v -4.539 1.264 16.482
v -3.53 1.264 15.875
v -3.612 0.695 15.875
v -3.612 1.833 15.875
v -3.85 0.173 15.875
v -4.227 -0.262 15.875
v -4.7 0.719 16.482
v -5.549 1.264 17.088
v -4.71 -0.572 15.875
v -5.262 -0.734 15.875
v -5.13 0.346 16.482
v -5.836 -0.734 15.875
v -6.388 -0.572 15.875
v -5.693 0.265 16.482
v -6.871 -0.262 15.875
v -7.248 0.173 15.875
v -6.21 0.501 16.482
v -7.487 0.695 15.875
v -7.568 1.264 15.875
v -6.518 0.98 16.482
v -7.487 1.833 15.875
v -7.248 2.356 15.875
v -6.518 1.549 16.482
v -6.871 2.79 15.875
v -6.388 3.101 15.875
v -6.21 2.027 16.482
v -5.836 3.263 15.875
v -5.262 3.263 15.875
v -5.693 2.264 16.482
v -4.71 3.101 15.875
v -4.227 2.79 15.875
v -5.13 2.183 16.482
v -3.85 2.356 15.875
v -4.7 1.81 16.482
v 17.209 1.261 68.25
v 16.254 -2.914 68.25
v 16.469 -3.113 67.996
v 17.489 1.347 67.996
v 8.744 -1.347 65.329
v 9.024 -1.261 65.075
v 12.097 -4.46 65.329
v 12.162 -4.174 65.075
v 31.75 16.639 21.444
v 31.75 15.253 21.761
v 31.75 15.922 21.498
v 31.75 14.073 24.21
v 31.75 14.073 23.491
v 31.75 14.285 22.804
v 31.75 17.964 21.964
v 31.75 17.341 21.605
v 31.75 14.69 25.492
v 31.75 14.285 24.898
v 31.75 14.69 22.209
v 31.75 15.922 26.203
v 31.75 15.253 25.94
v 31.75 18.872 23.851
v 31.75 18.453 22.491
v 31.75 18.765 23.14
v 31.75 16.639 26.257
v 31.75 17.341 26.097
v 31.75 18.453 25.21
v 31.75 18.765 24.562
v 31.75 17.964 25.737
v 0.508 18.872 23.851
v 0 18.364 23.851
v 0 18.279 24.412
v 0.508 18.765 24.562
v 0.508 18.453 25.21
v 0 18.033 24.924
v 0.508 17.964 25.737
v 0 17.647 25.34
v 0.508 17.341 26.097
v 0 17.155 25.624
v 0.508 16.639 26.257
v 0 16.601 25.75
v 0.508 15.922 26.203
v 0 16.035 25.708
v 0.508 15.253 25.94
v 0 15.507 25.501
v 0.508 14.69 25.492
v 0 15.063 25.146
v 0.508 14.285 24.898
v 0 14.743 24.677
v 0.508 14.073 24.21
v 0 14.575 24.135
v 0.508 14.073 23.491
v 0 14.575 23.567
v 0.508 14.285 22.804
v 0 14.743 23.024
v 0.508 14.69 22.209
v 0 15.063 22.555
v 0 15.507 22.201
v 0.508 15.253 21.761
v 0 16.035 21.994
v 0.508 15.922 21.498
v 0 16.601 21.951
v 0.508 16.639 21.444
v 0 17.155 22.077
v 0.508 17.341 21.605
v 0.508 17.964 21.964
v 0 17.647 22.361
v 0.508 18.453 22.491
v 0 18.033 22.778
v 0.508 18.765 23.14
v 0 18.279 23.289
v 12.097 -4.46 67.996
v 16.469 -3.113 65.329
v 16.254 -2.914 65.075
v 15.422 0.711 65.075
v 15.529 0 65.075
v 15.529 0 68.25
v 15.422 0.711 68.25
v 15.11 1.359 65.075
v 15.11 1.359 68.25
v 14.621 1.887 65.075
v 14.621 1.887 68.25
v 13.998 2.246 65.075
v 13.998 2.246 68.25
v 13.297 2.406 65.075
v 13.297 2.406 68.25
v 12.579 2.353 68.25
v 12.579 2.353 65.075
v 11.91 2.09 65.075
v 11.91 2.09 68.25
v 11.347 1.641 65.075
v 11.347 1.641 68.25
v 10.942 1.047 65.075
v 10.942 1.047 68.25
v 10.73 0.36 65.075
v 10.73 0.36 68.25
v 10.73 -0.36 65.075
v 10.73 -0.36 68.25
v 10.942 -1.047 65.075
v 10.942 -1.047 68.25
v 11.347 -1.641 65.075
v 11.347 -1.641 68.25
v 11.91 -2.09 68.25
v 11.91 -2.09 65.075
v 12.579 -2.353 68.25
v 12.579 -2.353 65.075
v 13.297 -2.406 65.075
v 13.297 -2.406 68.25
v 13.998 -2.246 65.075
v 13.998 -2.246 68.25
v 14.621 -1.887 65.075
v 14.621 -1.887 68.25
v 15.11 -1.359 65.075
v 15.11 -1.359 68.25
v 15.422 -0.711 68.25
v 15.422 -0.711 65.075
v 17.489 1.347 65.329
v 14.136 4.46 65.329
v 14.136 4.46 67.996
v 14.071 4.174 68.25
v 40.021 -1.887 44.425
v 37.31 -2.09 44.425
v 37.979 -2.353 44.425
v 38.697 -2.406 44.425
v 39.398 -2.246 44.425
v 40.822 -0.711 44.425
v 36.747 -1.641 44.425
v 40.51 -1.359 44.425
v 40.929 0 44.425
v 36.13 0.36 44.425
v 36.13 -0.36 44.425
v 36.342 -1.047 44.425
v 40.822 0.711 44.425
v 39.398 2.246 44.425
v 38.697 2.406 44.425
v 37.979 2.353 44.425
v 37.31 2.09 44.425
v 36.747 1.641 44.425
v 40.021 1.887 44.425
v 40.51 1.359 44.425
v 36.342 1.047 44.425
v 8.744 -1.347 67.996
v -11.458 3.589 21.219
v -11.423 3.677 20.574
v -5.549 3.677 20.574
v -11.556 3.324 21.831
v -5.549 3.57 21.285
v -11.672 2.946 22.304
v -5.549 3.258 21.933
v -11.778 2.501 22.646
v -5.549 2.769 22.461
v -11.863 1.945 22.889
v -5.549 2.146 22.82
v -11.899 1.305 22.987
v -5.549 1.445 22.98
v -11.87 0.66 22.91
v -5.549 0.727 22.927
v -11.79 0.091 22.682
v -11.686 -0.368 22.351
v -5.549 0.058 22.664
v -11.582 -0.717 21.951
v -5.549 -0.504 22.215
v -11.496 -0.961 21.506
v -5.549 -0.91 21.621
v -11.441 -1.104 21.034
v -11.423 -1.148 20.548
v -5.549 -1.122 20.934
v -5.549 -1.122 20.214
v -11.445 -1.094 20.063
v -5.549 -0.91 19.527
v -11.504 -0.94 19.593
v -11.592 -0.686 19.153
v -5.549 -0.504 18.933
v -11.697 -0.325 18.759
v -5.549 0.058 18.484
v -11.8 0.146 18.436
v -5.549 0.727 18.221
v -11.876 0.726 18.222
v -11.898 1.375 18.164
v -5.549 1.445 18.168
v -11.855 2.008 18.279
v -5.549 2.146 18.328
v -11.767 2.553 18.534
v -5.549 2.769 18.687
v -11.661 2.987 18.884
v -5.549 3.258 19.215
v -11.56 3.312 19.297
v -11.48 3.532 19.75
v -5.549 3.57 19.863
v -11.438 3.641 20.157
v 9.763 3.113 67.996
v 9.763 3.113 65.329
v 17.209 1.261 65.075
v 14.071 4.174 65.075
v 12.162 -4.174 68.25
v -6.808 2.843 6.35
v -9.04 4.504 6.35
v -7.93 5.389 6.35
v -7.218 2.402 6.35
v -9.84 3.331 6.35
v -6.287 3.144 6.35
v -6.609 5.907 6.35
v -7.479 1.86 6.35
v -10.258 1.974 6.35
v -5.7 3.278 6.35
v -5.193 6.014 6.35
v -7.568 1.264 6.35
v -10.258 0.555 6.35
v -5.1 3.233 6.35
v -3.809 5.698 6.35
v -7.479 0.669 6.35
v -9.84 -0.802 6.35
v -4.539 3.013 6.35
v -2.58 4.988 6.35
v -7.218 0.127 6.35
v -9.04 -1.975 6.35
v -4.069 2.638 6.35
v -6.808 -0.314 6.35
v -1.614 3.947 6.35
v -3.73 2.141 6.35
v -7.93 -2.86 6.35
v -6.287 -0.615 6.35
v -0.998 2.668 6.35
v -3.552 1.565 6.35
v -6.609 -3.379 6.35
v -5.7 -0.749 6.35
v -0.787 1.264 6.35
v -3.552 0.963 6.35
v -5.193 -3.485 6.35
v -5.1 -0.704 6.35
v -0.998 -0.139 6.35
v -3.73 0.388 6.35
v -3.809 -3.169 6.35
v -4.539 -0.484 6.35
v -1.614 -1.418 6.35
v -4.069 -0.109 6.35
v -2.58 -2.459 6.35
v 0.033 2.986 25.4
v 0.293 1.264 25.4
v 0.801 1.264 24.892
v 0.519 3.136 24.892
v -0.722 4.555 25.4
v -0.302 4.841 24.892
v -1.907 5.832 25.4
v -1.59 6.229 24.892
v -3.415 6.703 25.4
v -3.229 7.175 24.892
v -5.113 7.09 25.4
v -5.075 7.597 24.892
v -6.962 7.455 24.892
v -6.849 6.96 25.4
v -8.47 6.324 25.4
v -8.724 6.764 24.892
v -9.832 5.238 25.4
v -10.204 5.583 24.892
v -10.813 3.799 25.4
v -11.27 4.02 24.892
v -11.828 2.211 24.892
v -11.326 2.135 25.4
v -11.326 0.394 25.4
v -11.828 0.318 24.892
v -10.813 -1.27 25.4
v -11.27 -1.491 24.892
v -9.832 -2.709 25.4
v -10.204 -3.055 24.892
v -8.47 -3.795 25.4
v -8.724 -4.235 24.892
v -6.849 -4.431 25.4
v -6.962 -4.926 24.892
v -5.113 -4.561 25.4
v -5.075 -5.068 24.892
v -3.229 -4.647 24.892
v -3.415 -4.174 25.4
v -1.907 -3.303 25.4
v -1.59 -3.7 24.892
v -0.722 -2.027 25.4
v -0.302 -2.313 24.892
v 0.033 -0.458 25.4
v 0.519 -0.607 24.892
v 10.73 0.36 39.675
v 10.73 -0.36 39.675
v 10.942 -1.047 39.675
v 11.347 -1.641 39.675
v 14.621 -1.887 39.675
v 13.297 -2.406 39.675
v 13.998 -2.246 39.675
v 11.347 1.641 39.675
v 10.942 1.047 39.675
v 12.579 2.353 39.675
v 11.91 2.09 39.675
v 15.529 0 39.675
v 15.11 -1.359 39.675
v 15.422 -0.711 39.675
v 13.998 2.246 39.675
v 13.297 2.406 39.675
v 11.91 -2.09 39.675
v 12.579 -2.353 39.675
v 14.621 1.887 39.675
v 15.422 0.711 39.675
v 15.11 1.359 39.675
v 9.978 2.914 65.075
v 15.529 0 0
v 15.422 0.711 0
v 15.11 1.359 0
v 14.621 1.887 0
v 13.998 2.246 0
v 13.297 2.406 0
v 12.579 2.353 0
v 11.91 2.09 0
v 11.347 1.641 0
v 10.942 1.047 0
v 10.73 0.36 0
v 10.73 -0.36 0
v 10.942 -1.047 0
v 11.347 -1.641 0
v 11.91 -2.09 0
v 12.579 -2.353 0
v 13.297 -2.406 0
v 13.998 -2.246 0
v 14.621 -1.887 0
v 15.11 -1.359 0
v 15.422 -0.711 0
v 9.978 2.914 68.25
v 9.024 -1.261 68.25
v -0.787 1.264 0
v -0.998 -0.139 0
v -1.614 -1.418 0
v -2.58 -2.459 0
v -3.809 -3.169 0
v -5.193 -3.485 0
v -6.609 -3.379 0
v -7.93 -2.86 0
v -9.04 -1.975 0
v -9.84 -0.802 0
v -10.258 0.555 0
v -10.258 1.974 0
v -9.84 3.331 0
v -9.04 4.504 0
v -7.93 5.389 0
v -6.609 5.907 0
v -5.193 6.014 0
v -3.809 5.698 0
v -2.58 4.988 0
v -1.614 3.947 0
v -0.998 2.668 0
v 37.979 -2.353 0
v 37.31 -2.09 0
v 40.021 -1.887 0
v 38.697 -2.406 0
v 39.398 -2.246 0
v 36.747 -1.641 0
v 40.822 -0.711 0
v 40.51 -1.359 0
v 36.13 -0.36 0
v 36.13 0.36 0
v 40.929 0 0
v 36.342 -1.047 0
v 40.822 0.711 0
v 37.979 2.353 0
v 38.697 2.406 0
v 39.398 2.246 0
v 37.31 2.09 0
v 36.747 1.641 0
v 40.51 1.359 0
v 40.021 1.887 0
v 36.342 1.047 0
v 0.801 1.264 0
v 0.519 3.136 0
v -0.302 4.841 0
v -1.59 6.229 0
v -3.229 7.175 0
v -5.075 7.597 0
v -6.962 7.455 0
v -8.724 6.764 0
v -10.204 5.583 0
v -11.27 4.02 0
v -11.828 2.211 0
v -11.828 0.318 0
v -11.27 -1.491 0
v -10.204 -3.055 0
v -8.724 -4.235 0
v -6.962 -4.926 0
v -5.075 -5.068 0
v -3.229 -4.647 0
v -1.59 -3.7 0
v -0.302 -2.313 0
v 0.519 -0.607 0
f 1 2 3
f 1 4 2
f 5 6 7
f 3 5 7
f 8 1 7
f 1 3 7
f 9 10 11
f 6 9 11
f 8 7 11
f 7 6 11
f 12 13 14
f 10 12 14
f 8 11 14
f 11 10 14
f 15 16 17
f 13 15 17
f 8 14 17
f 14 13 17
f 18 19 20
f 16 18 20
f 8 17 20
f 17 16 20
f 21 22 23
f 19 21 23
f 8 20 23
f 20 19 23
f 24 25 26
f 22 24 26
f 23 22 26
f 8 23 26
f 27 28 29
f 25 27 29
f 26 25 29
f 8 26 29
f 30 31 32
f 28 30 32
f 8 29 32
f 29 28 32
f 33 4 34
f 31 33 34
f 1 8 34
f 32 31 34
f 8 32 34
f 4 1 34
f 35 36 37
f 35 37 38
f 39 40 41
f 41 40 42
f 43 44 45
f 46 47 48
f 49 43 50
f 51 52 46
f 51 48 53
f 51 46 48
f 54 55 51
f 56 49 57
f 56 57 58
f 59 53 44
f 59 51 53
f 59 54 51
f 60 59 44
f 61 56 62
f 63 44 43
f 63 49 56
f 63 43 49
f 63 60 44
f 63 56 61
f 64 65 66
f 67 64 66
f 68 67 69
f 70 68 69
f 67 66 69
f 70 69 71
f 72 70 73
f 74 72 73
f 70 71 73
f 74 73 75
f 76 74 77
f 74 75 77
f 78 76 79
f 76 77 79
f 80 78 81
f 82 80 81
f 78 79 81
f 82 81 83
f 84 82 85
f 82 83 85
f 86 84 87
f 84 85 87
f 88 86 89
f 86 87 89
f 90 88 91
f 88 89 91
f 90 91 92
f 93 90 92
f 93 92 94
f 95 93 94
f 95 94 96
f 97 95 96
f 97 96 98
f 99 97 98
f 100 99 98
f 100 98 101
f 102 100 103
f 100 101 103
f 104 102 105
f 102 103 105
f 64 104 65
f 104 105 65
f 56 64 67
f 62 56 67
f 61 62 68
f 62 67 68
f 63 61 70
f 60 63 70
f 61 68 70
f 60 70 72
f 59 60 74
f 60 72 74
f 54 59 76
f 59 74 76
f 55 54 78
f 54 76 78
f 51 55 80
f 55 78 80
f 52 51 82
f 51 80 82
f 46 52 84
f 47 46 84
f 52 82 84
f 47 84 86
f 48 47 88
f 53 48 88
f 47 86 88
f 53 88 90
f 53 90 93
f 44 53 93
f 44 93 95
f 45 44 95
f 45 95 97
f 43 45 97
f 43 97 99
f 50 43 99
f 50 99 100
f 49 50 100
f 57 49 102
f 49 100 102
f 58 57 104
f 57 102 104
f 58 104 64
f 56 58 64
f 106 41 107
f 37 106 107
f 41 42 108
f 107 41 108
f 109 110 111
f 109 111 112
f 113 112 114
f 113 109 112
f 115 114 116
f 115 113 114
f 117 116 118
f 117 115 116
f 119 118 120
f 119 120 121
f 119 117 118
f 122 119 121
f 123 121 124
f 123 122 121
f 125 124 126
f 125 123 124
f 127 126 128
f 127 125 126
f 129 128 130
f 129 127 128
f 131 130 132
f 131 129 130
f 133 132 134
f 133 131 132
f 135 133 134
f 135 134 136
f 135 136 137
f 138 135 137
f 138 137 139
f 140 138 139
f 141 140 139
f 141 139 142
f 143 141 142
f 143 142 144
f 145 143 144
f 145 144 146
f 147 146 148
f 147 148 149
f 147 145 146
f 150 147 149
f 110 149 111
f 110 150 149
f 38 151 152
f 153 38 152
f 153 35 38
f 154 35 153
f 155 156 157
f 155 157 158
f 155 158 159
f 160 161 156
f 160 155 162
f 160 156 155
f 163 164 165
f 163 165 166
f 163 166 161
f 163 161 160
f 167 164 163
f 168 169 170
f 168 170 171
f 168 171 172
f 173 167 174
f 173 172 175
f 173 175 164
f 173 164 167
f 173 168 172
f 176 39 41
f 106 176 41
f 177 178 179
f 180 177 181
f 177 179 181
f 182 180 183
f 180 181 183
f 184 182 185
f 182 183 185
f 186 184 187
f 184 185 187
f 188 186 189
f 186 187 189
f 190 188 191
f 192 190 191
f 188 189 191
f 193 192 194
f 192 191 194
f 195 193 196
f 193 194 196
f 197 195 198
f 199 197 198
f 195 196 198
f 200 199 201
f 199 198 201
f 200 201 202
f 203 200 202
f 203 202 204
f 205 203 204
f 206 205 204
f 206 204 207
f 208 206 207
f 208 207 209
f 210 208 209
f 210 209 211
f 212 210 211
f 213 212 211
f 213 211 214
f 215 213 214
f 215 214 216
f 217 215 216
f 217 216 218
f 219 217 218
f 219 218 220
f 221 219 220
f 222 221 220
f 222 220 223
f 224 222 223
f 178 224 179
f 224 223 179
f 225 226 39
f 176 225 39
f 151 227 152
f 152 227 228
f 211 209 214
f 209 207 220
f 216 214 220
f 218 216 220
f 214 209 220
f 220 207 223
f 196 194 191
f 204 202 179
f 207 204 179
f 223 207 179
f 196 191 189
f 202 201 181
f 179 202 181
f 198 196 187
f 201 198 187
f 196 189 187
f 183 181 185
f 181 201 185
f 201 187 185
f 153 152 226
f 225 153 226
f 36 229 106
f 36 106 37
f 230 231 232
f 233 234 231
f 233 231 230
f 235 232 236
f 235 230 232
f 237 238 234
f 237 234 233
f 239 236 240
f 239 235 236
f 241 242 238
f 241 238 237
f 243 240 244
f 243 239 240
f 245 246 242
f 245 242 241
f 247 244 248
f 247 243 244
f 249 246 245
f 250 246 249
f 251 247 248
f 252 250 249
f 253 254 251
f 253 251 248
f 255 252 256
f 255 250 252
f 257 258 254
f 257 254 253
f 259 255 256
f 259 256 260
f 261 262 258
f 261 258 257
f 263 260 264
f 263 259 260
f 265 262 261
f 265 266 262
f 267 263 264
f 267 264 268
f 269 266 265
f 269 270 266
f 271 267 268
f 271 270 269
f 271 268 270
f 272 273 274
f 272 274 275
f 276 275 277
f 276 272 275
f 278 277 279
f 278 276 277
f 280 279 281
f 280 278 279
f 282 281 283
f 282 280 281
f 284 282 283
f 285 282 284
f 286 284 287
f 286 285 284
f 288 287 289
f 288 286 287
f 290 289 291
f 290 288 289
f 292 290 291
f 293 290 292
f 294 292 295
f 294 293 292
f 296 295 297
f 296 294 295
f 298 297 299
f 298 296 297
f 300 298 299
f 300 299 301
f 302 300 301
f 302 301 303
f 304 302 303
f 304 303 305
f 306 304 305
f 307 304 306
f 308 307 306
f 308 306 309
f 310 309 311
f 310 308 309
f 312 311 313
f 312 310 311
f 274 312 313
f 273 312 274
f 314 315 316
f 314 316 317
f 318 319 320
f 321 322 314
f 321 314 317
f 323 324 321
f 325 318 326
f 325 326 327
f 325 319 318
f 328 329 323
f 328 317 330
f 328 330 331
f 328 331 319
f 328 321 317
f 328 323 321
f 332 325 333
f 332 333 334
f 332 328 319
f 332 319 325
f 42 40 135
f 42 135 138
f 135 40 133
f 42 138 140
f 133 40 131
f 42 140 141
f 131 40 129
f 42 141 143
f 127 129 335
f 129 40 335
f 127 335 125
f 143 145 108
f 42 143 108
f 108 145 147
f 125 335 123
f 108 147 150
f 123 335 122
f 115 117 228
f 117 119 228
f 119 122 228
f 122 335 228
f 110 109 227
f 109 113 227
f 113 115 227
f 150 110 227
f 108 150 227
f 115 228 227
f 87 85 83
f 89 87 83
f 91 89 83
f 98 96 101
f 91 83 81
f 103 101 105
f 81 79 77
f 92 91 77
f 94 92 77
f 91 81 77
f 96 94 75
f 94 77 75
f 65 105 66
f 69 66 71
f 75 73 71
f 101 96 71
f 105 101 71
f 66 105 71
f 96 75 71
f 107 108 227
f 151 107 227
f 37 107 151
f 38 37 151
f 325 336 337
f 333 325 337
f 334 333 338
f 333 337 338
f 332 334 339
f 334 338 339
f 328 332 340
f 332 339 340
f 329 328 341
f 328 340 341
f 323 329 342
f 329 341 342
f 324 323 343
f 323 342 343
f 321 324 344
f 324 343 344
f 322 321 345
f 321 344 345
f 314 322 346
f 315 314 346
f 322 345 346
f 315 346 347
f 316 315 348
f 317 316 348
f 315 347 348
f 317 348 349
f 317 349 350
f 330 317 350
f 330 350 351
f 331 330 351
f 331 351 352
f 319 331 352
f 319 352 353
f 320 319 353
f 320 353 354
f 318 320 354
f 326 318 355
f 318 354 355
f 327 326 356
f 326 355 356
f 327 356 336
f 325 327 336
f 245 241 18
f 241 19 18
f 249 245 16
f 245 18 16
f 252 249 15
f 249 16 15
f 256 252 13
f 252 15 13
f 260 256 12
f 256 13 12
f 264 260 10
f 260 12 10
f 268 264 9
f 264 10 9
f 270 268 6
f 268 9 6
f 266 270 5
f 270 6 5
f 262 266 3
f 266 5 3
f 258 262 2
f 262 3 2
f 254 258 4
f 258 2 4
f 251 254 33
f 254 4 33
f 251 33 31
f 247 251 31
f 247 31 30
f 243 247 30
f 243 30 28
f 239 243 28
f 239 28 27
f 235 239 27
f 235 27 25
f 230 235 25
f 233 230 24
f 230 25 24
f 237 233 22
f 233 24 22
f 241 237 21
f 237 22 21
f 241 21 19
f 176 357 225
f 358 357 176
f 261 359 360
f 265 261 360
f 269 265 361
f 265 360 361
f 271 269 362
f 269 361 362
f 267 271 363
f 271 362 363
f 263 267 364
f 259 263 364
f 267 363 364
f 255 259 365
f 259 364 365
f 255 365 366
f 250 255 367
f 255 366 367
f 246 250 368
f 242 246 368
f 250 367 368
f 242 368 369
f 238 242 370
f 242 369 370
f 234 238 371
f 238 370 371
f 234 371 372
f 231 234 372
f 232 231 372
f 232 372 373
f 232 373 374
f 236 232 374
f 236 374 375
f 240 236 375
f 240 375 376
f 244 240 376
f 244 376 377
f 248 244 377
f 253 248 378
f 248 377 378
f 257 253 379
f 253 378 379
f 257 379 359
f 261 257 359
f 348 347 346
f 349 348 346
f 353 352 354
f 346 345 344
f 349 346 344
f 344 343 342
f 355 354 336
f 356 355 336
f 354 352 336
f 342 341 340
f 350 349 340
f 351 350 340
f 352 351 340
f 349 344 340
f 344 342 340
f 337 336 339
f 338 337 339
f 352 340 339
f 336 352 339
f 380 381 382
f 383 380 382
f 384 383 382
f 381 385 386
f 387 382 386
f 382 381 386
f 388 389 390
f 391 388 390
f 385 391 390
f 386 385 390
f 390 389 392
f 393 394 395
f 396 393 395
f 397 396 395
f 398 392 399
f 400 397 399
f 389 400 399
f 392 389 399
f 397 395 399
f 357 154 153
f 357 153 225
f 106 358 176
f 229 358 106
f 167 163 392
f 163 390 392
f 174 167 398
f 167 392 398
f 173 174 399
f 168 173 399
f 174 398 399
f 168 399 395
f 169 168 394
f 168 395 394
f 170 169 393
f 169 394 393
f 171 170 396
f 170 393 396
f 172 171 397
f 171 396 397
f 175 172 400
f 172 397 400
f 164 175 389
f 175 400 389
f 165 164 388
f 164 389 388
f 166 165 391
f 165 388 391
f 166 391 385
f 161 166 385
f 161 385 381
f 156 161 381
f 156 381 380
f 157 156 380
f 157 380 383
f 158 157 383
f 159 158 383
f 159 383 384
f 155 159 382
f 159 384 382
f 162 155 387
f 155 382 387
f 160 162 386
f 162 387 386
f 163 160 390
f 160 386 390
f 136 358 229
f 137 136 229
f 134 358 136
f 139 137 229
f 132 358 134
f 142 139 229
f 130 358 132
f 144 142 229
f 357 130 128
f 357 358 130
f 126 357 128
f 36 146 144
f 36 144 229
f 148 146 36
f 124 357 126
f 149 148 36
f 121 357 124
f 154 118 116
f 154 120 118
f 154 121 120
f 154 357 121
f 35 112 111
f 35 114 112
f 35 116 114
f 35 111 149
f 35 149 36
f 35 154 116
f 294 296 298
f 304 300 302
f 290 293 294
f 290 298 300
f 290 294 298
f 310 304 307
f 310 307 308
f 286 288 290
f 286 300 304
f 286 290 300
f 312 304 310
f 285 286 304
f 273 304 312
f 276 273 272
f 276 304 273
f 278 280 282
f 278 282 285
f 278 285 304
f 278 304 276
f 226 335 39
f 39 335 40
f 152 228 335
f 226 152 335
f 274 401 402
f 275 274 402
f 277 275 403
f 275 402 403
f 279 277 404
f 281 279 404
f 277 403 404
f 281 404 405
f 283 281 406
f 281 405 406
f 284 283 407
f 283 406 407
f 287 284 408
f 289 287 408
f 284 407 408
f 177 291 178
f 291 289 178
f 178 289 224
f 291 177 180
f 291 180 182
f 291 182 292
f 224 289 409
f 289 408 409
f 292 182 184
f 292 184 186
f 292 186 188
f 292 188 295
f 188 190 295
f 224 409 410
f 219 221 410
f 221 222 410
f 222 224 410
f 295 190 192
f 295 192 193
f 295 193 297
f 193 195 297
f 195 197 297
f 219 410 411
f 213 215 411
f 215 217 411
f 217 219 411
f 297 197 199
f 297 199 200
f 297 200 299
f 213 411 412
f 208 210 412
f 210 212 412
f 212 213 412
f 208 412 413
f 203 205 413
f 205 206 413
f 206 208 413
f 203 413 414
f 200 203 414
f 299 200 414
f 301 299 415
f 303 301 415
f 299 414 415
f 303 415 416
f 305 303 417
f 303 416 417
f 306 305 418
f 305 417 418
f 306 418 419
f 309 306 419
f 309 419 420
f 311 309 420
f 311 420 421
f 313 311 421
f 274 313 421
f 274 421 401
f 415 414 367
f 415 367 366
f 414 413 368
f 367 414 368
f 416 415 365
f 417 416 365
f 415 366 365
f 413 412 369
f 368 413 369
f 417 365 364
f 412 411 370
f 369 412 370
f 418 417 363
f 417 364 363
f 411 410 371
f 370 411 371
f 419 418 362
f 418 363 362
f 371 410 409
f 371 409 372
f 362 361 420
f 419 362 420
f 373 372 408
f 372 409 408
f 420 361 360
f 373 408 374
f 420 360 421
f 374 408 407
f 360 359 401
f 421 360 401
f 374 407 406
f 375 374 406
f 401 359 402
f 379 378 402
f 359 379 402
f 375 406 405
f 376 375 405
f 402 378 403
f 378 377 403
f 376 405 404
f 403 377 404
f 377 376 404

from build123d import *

# Parameters (mm, degrees)
F0_R       = 2.413
F1_DEPTH   = 39.6748
F3_DEPTH   = 4.7498
F5_R       = 2.413
F6_DEPTH   = 3.175
F7_SIZE    = 0.254
F8_R       = 6.35
F9_DEPTH   = 25.4
F10_R      = 4.7625
F11_DEPTH  = 6.35
F13_D      = 4.0386
F13_DEPTH  = 9.525
F13_TIP    = 1.213317848
F15_R      = 2.413
F16_DEPTH  = 6.351
F17_R      = 2.413
F18_DEPTH  = 31.75
F19_SIZE   = 0.508
F19_2_SIZE = 0.508


with BuildPart() as f1:
    # F0 (on Top) → F1 (new body)
    with BuildSketch(Plane.XY):
        with Locations((13.1162918267, 0)):
            Circle(F0_R)
    extrude(amount=F1_DEPTH)


with BuildPart() as f2_1:
    # F2: copy of F1
    add(f1.part.moved(Location((25.4, 0, 0))))

    # F3 (add): a face of the model
    f3_faces = [f2_1.faces().sort_by_distance(p)[0] for p in [
        (38.5162918267, 0, 39.6748),
    ]]
    extrude(f3_faces, amount=F3_DEPTH)


with BuildPart() as f6:
    # F5 (on offset) → F6 (new body)
    with BuildSketch(Plane.XY.offset(65.0748)):
        Polygon((9.7633792917, 3.1132184653), (8.7437092808, -1.3470981994), (12.0966218158, -4.4603166646), (16.4692043617, -3.1132184653), (17.4888743727, 1.3470981994), (14.1359618377, 4.4603166646), align=None)
        with Locations((13.1162918267, 0)):
            Circle(F5_R, mode=Mode.SUBTRACT)
    extrude(amount=F6_DEPTH)

    # F7
    f7_edges = [f6.edges().sort_by_distance(p)[0] for p in [
        (9.253544, 0.88306, 68.2498),
        (11.949671, 3.786768, 68.2498),
        (15.812418, 2.903707, 68.2498),
        (16.979039, -0.88306, 68.2498),
        (14.282913, -3.786768, 68.2498),
        (10.420166, -2.903707, 68.2498),
        (15.812418, 2.903707, 65.0748),
        (11.949671, 3.786768, 65.0748),
        (9.253544, 0.88306, 65.0748),
        (10.420166, -2.903707, 65.0748),
        (14.282913, -3.786768, 65.0748),
        (16.979039, -0.88306, 65.0748),
    ]]
    chamfer(f7_edges, length=F7_SIZE)


with BuildPart() as f9:
    # F8 (on Top) → F9 (new body)
    with BuildSketch(Plane.XY):
        with Locations((-5.549098365, 1.2644021772)):
            Circle(F8_R)
    extrude(amount=F9_DEPTH)

    # F10 (on face) → F11 (cut)
    with BuildSketch(Plane(origin=(0, 0, 0), x_dir=(1, 0, 0), z_dir=(0, 0, -1))):
        with Locations((-5.549098365, -1.2644021772)):
            Circle(F10_R)
    extrude(amount=-F11_DEPTH, mode=Mode.SUBTRACT)

    # F13
    with Locations(Plane(origin=(0, 0, 6.35), x_dir=(1, 0, 0), z_dir=(0, 0, -1))):
        with Locations((-5.549098365, -1.2644021772)):
            Hole(F13_D / 2, depth=F13_DEPTH)
            with Locations((0, 0, -(F13_DEPTH + F13_TIP / 2))):  # 118° drill point
                Cone(0, F13_D / 2, F13_TIP, mode=Mode.SUBTRACT)

    # F15 (on face) → F16 (cut, through all)
    with BuildSketch(Plane.YZ.offset(-5.549098365)):
        with Locations((1.2644021772, 20.574)):
            Circle(F15_R)
    extrude(amount=-F16_DEPTH, mode=Mode.SUBTRACT)

    # F19#2
    f19_2_edges = [f9.edges().sort_by_distance(p)[0] for p in [
        (-11.899098, 1.264402, 25.4),
    ]]
    chamfer(f19_2_edges, length=F19_2_SIZE)


with BuildPart() as f18:
    # F17 (on Right) → F18 (new body)
    with BuildSketch(Plane.YZ):
        with Locations((16.4590254426, 23.8507483155)):
            Circle(F17_R)
    extrude(amount=F18_DEPTH)

    # F19
    f19_edges = [f18.edges().sort_by_distance(p)[0] for p in [
        (0, 14.046025, 23.850748),
    ]]
    chamfer(f19_edges, length=F19_SIZE)


solid = Compound([f1.part, f2_1.part, f6.part, f9.part, f18.part])
